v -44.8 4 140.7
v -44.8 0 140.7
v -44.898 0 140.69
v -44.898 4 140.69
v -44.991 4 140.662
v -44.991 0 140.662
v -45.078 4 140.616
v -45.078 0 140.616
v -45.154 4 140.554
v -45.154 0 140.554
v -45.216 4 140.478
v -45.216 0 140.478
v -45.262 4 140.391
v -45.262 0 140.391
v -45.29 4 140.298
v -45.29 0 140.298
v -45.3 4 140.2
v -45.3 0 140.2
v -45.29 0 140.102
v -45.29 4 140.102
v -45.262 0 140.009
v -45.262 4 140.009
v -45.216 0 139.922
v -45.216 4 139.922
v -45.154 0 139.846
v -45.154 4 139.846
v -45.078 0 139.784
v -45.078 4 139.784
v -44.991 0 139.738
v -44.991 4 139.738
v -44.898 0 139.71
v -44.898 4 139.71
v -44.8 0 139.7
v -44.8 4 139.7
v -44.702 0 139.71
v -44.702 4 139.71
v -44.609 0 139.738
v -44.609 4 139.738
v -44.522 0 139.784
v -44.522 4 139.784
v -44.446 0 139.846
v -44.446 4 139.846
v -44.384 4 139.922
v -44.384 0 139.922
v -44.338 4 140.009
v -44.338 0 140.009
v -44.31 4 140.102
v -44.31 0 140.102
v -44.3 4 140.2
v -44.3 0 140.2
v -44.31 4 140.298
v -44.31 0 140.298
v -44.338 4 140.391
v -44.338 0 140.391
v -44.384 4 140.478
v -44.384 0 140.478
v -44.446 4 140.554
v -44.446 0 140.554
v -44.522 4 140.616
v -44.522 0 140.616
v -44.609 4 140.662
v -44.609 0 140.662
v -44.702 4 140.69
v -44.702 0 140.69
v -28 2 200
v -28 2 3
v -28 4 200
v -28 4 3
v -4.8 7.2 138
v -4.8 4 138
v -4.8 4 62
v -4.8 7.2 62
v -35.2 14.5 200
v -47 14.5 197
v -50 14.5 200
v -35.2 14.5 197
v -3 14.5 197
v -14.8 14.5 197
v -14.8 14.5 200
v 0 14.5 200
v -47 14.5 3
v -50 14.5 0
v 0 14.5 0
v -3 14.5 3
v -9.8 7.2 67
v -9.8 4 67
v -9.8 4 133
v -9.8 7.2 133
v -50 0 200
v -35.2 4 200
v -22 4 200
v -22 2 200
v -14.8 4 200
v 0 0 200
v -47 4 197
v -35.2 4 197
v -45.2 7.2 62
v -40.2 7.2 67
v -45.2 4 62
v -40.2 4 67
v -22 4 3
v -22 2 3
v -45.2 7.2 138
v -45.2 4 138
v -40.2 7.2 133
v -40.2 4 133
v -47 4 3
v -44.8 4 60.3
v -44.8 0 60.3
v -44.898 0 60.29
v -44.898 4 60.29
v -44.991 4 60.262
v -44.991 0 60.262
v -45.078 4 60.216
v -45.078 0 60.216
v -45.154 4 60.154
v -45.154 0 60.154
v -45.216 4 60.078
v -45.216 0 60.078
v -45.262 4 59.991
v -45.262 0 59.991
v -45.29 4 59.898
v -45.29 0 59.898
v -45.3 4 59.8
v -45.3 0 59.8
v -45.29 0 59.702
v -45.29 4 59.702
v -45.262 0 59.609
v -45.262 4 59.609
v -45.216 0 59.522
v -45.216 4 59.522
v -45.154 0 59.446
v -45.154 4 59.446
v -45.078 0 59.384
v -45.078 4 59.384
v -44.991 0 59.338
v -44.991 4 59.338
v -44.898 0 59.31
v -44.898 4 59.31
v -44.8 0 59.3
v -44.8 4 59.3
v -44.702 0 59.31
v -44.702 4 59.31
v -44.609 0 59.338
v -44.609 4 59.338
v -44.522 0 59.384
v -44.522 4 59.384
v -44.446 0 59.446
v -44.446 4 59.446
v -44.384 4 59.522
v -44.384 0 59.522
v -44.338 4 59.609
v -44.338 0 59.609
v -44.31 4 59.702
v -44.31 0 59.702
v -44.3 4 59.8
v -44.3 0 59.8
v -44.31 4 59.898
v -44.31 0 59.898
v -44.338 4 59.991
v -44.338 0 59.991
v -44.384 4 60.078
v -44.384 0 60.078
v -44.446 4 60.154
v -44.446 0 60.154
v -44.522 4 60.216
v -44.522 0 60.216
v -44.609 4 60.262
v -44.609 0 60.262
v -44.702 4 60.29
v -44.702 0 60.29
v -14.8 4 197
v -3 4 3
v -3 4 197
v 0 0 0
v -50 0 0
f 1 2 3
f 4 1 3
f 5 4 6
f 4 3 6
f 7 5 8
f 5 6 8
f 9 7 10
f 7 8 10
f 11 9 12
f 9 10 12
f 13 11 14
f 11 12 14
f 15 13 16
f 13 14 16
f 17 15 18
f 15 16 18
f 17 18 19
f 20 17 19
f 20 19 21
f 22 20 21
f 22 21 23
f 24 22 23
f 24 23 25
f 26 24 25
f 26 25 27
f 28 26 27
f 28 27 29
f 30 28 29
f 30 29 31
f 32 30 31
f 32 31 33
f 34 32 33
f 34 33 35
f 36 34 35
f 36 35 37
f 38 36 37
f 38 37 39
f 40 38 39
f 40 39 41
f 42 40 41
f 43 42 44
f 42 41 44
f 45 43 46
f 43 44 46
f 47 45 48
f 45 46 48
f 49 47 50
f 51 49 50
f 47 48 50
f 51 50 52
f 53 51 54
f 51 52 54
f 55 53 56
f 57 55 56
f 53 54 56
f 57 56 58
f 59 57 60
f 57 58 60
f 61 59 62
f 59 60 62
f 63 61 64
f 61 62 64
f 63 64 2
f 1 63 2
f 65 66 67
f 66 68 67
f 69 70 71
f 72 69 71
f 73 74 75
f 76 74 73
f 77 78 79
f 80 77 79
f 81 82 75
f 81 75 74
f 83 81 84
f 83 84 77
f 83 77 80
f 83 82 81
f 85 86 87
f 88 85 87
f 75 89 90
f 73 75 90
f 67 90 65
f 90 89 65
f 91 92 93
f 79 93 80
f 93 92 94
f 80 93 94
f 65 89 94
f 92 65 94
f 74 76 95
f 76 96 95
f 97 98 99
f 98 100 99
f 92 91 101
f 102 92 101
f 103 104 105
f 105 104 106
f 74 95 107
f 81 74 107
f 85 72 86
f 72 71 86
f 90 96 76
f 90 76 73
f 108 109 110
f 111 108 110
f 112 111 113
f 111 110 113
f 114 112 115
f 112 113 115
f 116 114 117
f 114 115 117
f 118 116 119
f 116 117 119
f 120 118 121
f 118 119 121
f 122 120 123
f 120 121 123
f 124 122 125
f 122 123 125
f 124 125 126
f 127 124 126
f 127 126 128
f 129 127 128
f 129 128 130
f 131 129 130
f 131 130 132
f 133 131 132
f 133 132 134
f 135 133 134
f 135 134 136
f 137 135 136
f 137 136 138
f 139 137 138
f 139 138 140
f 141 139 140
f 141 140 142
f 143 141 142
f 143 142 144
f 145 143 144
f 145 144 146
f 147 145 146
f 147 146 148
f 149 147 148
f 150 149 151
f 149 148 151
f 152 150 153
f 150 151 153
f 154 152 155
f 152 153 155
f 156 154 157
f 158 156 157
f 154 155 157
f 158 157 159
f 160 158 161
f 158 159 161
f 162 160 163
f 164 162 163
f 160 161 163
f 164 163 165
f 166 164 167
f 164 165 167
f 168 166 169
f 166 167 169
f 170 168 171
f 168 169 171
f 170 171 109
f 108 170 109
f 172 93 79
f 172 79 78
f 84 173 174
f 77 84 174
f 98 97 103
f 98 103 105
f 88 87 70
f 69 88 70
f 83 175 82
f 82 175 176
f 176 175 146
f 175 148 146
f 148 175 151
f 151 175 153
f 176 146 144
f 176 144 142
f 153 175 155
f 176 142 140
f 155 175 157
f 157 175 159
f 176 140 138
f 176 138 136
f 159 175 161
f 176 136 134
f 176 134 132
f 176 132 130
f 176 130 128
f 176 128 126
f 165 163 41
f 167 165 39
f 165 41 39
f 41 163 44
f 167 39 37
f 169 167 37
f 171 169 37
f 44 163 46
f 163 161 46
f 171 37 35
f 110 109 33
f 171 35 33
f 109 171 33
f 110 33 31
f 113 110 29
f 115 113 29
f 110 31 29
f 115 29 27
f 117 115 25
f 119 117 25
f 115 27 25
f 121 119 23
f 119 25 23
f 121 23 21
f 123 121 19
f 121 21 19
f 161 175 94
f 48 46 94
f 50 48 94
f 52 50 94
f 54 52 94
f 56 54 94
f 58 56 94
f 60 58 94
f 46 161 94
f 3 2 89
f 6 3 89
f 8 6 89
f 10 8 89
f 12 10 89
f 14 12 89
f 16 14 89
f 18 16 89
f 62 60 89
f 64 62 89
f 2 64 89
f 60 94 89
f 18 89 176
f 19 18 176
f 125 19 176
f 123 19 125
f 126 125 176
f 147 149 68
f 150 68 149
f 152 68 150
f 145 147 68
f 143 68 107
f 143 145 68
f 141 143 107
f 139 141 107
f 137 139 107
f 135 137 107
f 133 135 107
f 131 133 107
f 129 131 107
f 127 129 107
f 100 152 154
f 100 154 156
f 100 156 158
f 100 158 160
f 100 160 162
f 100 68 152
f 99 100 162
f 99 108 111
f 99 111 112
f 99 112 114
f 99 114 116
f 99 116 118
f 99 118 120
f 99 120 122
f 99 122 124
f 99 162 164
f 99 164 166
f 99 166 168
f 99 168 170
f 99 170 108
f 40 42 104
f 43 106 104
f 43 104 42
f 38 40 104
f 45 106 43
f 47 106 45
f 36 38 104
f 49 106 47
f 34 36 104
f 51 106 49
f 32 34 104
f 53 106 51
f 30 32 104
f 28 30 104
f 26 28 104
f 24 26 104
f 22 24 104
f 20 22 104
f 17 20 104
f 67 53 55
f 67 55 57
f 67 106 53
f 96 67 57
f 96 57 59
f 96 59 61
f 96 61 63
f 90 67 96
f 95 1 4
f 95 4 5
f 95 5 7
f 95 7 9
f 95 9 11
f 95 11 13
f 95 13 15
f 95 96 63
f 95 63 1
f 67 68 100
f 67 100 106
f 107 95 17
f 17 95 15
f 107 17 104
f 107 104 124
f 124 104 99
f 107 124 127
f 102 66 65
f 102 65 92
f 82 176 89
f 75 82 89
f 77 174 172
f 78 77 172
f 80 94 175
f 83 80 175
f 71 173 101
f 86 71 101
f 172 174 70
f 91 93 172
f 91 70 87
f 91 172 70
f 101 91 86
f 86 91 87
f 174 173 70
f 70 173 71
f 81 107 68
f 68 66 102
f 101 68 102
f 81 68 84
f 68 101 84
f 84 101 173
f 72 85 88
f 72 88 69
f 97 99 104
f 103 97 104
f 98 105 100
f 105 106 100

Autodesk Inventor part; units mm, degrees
ref_plane "YZ Plane" through (0, 0, 0) normal (1, 0, 0) x (0, 1, 0)
ref_plane "XZ Plane" through (0, 0, 0) normal (0, 1, 0) x (-1, 0, 0)
ref_plane "XY Plane" through (0, 0, 0) normal (0, 0, 1) x (1, 0, 0)
sketch "Sketch1" plane through (0, 0, 0) normal (0, 1, 0) x (-1, 0, 0)
  line L0 (0, 0) -> (50, 0)
  line L1 (50, 0) -> (50, 200)
  line L2 (50, 200) -> (0, 200)
  line L3 (0, 200) -> (0, 0)
  dimension "d1" = 50
  dimension "d2" = 200
extrude "Base" add sketch "Sketch1" along normal blind 4
sketch "Sketch3" plane through (0, 4, 0) normal (0, 1, 0) x (1, 0, 0)
  line L0 (-50, 0) -> (-50, -200) projected
  line L1 (-50, -200) -> (0, -200) projected
  line L2 (0, -200) -> (0, 0) projected
  line L3 (0, 0) -> (-50, 0) projected
  line L4 (-47, -197) -> (-47, -3)
  line L5 (-47, -3) -> (-3, -3)
  line L6 (-3, -3) -> (-3, -197)
  line L7 (-3, -197) -> (-47, -197)
  line L8 (-25, -198.6939) -> (-25, 11.8917)
  line L9 (-35.2, -200) -> (-14.8, -200)
  line L10 (-14.8, -200) -> (-14.8, -197)
  line L11 (-14.8, -197) -> (-35.2, -197)
  line L12 (-35.2, -197) -> (-35.2, -200)
  point P0 (-25, 0)
  point P1 (-25, -200)
  point P2 (-25, -197)
  dimension "d10" = 3
  dimension "d11" = 20.4
extrude "Muros" add sketch "Sketch3" along normal blind 10.5 contours L3 L8 L5 L4 L7 L12 L1 L0 | L3 L2 L1 L10 L7 L6 L5 L8
sketch "Sketch4" plane through (0, 4, 0) normal (0, 1, 0) x (1, 0, 0)
  line L0 (-35.2, -200) -> (-14.8, -200) projected
  line L1 (-47, -3) -> (-3, -3) projected
  line L2 (-28, -200) -> (-22, -200)
  line L3 (-22, -200) -> (-22, -3)
  line L4 (-22, -3) -> (-28, -3)
  line L5 (-28, -3) -> (-28, -200)
  line L6 (-3, -3) -> (-47, -3) projected
  point P0 (0, 0)
  point P1 (-25, -3)
  point P2 (-25, -3)
  point P3 (-25, -200)
  dimension "d14" = 6
extrude "Rail" cut sketch "Sketch4" against normal blind 2
sketch "Sketch5" plane through (0, 4, 0) normal (0, 1, 0) x (1, 0, 0)
  line L0 (-45.2, -138) -> (-40.2, -138)
  line L1 (-40.2, -138) -> (-40.2, -62)
  line L2 (-40.2, -62) -> (-45.2, -62)
  line L3 (-45.2, -62) -> (-45.2, -138)
  line L4 (-9.8, -138) -> (-4.8, -138)
  line L5 (-4.8, -138) -> (-4.8, -62)
  line L6 (-4.8, -62) -> (-9.8, -62)
  line L7 (-9.8, -62) -> (-9.8, -138)
  line L8 (-28, -200) -> (-28, -3) projected
  line L9 (-22, -3) -> (-22, -200) projected
  line L10 (-35.2, -200) -> (-28, -200) projected
  line L11 (-22, -200) -> (-14.8, -200) projected
  line L12 (-40.2, -138) -> (-28, -138)
  line L13 (-9.8, -138) -> (-22, -138)
  line L14 (-22, -3) -> (-22, -200) projected
  line L15 (-40.2, -138) -> (-40.2, -200)
  point P0 (0, 0)
  dimension "d17" = 30.4
  dimension "d18" = 62
  dimension "d19" = 76
  dimension "d20" = 5
extrude "Extrusion4" add sketch "Sketch5" along normal blind 3.2
draft "FaceDraft1" angle 45 pull direction (1, 0, 0) faces at (-43.5333, 5.0667, 138) fixed edges at (-45.2, 5.6, 138)
draft "FaceDraft2" angle 45 pull direction (1, 0, 0) faces at (-41.8667, 5.0667, 62) fixed edges at (-45.2, 5.6, 62)
draft "FaceDraft3" angle 45 pull direction (-1, 0, 0) faces at (-8.1333, 5.0667, 138) fixed edges at (-4.8, 5.6, 138)
draft "FaceDraft4" angle 45 pull direction (-1, 0, 0) faces at (-6.4667, 5.0667, 62) fixed edges at (-4.8, 5.6, 62)
ref_plane "Work Plane1" through (0, 0, 100) normal (0, 0, -1) x (-1, 0, 0)
ref_plane "Work Plane2" through (-25, 0, 200) normal (1, 0, 0) x (0, 0, -1)
sketch "Sketch6" plane through (0, 4, 0) normal (0, 1, 0) x (1, 0, 0)
  line L0 (-45.2, -62) -> (-40.2, -67) projected
  line L1 (-45.2, -138) -> (-45.2, -62) projected
  line L2 (-47, -3) -> (-47, -197) projected
  line L3 (-40.2, -133) -> (-45.2, -138) projected
  point P0 (0, 0)
  point P1 (-44.8, -59.8)
  point P2 (-44.8, -140.2)
  dimension "d27" = 2.2
  dimension "d28" = 2.2
  dimension "d29" = 2.2
  dimension "d30" = 2.2
hole "Hole1" at (-44.8, 4, 59.8) at (-44.8, 4, 140.2) direction (0, -1, 0) diameter 1 end through all
equation "\"d1\" = base_ancho"
equation "\"d2\" = base_largo"
equation "\"d4\" = base_grosor"
equation "\"d10\" = base_muros_grosor"
equation "\"d11\" = base_muros_separación"
equation "\"d12\" = base_muros_alto"
equation "\"d14\" = base_rail_ancho"
equation "\"d15\" = base_rail_profundidad"
equation "\"d17\" = hoja_ancho + 2 * hoja_diente_ancho + 2 * general_margen"
equation "\"d18\" = -0.5 * base_deslizador_largo + 0.5 * base_largo"
equation "\"d19\" = base_deslizador_largo"
equation "\"d20\" = base_deslizador_ancho"
equation "\"d21\" = base_deslizador_alto"
equation "\"d23\" = base_deslizador_agarre"
equation "\"d24\" = base_deslizador_agarre"
equation "\"d25\" = base_deslizador_agarre"
equation "\"d26\" = base_deslizador_agarre"
equation "\"d27\" = base_traba_y"
equation "\"d28\" = base_traba_x"
equation "\"d29\" = base_traba_y"
equation "\"d30\" = base_traba_x"
equation "\"d31\" = traba_eje_diametro"
equation "\"base_ancho\" = 50"
equation "\"base_largo\" = 200"
equation "\"base_grosor\" = 4"
equation "\"base_muros_grosor\" = 3"
equation "\"base_muros_separación\" = 20.4"
equation "\"base_muros_alto\" = 10.5"
equation "\"base_rail_ancho\" = 6"
equation "\"base_rail_profundidad\" = 2"
equation "\"hoja_ancho\" = 20"
equation "\"hoja_diente_ancho\" = 5"
equation "\"general_margen\" = 0.2"
equation "\"base_deslizador_largo\" = 76"
equation "\"base_deslizador_ancho\" = 5"
equation "\"base_deslizador_alto\" = 3.2"
equation "\"base_deslizador_agarre\" = 45deg"
equation "\"traba_eje_diametro\" = 1"
equation "\"base_traba_y\" = 2.2"
equation "\"base_traba_x\" = 2.2"
properties part number "Base"
